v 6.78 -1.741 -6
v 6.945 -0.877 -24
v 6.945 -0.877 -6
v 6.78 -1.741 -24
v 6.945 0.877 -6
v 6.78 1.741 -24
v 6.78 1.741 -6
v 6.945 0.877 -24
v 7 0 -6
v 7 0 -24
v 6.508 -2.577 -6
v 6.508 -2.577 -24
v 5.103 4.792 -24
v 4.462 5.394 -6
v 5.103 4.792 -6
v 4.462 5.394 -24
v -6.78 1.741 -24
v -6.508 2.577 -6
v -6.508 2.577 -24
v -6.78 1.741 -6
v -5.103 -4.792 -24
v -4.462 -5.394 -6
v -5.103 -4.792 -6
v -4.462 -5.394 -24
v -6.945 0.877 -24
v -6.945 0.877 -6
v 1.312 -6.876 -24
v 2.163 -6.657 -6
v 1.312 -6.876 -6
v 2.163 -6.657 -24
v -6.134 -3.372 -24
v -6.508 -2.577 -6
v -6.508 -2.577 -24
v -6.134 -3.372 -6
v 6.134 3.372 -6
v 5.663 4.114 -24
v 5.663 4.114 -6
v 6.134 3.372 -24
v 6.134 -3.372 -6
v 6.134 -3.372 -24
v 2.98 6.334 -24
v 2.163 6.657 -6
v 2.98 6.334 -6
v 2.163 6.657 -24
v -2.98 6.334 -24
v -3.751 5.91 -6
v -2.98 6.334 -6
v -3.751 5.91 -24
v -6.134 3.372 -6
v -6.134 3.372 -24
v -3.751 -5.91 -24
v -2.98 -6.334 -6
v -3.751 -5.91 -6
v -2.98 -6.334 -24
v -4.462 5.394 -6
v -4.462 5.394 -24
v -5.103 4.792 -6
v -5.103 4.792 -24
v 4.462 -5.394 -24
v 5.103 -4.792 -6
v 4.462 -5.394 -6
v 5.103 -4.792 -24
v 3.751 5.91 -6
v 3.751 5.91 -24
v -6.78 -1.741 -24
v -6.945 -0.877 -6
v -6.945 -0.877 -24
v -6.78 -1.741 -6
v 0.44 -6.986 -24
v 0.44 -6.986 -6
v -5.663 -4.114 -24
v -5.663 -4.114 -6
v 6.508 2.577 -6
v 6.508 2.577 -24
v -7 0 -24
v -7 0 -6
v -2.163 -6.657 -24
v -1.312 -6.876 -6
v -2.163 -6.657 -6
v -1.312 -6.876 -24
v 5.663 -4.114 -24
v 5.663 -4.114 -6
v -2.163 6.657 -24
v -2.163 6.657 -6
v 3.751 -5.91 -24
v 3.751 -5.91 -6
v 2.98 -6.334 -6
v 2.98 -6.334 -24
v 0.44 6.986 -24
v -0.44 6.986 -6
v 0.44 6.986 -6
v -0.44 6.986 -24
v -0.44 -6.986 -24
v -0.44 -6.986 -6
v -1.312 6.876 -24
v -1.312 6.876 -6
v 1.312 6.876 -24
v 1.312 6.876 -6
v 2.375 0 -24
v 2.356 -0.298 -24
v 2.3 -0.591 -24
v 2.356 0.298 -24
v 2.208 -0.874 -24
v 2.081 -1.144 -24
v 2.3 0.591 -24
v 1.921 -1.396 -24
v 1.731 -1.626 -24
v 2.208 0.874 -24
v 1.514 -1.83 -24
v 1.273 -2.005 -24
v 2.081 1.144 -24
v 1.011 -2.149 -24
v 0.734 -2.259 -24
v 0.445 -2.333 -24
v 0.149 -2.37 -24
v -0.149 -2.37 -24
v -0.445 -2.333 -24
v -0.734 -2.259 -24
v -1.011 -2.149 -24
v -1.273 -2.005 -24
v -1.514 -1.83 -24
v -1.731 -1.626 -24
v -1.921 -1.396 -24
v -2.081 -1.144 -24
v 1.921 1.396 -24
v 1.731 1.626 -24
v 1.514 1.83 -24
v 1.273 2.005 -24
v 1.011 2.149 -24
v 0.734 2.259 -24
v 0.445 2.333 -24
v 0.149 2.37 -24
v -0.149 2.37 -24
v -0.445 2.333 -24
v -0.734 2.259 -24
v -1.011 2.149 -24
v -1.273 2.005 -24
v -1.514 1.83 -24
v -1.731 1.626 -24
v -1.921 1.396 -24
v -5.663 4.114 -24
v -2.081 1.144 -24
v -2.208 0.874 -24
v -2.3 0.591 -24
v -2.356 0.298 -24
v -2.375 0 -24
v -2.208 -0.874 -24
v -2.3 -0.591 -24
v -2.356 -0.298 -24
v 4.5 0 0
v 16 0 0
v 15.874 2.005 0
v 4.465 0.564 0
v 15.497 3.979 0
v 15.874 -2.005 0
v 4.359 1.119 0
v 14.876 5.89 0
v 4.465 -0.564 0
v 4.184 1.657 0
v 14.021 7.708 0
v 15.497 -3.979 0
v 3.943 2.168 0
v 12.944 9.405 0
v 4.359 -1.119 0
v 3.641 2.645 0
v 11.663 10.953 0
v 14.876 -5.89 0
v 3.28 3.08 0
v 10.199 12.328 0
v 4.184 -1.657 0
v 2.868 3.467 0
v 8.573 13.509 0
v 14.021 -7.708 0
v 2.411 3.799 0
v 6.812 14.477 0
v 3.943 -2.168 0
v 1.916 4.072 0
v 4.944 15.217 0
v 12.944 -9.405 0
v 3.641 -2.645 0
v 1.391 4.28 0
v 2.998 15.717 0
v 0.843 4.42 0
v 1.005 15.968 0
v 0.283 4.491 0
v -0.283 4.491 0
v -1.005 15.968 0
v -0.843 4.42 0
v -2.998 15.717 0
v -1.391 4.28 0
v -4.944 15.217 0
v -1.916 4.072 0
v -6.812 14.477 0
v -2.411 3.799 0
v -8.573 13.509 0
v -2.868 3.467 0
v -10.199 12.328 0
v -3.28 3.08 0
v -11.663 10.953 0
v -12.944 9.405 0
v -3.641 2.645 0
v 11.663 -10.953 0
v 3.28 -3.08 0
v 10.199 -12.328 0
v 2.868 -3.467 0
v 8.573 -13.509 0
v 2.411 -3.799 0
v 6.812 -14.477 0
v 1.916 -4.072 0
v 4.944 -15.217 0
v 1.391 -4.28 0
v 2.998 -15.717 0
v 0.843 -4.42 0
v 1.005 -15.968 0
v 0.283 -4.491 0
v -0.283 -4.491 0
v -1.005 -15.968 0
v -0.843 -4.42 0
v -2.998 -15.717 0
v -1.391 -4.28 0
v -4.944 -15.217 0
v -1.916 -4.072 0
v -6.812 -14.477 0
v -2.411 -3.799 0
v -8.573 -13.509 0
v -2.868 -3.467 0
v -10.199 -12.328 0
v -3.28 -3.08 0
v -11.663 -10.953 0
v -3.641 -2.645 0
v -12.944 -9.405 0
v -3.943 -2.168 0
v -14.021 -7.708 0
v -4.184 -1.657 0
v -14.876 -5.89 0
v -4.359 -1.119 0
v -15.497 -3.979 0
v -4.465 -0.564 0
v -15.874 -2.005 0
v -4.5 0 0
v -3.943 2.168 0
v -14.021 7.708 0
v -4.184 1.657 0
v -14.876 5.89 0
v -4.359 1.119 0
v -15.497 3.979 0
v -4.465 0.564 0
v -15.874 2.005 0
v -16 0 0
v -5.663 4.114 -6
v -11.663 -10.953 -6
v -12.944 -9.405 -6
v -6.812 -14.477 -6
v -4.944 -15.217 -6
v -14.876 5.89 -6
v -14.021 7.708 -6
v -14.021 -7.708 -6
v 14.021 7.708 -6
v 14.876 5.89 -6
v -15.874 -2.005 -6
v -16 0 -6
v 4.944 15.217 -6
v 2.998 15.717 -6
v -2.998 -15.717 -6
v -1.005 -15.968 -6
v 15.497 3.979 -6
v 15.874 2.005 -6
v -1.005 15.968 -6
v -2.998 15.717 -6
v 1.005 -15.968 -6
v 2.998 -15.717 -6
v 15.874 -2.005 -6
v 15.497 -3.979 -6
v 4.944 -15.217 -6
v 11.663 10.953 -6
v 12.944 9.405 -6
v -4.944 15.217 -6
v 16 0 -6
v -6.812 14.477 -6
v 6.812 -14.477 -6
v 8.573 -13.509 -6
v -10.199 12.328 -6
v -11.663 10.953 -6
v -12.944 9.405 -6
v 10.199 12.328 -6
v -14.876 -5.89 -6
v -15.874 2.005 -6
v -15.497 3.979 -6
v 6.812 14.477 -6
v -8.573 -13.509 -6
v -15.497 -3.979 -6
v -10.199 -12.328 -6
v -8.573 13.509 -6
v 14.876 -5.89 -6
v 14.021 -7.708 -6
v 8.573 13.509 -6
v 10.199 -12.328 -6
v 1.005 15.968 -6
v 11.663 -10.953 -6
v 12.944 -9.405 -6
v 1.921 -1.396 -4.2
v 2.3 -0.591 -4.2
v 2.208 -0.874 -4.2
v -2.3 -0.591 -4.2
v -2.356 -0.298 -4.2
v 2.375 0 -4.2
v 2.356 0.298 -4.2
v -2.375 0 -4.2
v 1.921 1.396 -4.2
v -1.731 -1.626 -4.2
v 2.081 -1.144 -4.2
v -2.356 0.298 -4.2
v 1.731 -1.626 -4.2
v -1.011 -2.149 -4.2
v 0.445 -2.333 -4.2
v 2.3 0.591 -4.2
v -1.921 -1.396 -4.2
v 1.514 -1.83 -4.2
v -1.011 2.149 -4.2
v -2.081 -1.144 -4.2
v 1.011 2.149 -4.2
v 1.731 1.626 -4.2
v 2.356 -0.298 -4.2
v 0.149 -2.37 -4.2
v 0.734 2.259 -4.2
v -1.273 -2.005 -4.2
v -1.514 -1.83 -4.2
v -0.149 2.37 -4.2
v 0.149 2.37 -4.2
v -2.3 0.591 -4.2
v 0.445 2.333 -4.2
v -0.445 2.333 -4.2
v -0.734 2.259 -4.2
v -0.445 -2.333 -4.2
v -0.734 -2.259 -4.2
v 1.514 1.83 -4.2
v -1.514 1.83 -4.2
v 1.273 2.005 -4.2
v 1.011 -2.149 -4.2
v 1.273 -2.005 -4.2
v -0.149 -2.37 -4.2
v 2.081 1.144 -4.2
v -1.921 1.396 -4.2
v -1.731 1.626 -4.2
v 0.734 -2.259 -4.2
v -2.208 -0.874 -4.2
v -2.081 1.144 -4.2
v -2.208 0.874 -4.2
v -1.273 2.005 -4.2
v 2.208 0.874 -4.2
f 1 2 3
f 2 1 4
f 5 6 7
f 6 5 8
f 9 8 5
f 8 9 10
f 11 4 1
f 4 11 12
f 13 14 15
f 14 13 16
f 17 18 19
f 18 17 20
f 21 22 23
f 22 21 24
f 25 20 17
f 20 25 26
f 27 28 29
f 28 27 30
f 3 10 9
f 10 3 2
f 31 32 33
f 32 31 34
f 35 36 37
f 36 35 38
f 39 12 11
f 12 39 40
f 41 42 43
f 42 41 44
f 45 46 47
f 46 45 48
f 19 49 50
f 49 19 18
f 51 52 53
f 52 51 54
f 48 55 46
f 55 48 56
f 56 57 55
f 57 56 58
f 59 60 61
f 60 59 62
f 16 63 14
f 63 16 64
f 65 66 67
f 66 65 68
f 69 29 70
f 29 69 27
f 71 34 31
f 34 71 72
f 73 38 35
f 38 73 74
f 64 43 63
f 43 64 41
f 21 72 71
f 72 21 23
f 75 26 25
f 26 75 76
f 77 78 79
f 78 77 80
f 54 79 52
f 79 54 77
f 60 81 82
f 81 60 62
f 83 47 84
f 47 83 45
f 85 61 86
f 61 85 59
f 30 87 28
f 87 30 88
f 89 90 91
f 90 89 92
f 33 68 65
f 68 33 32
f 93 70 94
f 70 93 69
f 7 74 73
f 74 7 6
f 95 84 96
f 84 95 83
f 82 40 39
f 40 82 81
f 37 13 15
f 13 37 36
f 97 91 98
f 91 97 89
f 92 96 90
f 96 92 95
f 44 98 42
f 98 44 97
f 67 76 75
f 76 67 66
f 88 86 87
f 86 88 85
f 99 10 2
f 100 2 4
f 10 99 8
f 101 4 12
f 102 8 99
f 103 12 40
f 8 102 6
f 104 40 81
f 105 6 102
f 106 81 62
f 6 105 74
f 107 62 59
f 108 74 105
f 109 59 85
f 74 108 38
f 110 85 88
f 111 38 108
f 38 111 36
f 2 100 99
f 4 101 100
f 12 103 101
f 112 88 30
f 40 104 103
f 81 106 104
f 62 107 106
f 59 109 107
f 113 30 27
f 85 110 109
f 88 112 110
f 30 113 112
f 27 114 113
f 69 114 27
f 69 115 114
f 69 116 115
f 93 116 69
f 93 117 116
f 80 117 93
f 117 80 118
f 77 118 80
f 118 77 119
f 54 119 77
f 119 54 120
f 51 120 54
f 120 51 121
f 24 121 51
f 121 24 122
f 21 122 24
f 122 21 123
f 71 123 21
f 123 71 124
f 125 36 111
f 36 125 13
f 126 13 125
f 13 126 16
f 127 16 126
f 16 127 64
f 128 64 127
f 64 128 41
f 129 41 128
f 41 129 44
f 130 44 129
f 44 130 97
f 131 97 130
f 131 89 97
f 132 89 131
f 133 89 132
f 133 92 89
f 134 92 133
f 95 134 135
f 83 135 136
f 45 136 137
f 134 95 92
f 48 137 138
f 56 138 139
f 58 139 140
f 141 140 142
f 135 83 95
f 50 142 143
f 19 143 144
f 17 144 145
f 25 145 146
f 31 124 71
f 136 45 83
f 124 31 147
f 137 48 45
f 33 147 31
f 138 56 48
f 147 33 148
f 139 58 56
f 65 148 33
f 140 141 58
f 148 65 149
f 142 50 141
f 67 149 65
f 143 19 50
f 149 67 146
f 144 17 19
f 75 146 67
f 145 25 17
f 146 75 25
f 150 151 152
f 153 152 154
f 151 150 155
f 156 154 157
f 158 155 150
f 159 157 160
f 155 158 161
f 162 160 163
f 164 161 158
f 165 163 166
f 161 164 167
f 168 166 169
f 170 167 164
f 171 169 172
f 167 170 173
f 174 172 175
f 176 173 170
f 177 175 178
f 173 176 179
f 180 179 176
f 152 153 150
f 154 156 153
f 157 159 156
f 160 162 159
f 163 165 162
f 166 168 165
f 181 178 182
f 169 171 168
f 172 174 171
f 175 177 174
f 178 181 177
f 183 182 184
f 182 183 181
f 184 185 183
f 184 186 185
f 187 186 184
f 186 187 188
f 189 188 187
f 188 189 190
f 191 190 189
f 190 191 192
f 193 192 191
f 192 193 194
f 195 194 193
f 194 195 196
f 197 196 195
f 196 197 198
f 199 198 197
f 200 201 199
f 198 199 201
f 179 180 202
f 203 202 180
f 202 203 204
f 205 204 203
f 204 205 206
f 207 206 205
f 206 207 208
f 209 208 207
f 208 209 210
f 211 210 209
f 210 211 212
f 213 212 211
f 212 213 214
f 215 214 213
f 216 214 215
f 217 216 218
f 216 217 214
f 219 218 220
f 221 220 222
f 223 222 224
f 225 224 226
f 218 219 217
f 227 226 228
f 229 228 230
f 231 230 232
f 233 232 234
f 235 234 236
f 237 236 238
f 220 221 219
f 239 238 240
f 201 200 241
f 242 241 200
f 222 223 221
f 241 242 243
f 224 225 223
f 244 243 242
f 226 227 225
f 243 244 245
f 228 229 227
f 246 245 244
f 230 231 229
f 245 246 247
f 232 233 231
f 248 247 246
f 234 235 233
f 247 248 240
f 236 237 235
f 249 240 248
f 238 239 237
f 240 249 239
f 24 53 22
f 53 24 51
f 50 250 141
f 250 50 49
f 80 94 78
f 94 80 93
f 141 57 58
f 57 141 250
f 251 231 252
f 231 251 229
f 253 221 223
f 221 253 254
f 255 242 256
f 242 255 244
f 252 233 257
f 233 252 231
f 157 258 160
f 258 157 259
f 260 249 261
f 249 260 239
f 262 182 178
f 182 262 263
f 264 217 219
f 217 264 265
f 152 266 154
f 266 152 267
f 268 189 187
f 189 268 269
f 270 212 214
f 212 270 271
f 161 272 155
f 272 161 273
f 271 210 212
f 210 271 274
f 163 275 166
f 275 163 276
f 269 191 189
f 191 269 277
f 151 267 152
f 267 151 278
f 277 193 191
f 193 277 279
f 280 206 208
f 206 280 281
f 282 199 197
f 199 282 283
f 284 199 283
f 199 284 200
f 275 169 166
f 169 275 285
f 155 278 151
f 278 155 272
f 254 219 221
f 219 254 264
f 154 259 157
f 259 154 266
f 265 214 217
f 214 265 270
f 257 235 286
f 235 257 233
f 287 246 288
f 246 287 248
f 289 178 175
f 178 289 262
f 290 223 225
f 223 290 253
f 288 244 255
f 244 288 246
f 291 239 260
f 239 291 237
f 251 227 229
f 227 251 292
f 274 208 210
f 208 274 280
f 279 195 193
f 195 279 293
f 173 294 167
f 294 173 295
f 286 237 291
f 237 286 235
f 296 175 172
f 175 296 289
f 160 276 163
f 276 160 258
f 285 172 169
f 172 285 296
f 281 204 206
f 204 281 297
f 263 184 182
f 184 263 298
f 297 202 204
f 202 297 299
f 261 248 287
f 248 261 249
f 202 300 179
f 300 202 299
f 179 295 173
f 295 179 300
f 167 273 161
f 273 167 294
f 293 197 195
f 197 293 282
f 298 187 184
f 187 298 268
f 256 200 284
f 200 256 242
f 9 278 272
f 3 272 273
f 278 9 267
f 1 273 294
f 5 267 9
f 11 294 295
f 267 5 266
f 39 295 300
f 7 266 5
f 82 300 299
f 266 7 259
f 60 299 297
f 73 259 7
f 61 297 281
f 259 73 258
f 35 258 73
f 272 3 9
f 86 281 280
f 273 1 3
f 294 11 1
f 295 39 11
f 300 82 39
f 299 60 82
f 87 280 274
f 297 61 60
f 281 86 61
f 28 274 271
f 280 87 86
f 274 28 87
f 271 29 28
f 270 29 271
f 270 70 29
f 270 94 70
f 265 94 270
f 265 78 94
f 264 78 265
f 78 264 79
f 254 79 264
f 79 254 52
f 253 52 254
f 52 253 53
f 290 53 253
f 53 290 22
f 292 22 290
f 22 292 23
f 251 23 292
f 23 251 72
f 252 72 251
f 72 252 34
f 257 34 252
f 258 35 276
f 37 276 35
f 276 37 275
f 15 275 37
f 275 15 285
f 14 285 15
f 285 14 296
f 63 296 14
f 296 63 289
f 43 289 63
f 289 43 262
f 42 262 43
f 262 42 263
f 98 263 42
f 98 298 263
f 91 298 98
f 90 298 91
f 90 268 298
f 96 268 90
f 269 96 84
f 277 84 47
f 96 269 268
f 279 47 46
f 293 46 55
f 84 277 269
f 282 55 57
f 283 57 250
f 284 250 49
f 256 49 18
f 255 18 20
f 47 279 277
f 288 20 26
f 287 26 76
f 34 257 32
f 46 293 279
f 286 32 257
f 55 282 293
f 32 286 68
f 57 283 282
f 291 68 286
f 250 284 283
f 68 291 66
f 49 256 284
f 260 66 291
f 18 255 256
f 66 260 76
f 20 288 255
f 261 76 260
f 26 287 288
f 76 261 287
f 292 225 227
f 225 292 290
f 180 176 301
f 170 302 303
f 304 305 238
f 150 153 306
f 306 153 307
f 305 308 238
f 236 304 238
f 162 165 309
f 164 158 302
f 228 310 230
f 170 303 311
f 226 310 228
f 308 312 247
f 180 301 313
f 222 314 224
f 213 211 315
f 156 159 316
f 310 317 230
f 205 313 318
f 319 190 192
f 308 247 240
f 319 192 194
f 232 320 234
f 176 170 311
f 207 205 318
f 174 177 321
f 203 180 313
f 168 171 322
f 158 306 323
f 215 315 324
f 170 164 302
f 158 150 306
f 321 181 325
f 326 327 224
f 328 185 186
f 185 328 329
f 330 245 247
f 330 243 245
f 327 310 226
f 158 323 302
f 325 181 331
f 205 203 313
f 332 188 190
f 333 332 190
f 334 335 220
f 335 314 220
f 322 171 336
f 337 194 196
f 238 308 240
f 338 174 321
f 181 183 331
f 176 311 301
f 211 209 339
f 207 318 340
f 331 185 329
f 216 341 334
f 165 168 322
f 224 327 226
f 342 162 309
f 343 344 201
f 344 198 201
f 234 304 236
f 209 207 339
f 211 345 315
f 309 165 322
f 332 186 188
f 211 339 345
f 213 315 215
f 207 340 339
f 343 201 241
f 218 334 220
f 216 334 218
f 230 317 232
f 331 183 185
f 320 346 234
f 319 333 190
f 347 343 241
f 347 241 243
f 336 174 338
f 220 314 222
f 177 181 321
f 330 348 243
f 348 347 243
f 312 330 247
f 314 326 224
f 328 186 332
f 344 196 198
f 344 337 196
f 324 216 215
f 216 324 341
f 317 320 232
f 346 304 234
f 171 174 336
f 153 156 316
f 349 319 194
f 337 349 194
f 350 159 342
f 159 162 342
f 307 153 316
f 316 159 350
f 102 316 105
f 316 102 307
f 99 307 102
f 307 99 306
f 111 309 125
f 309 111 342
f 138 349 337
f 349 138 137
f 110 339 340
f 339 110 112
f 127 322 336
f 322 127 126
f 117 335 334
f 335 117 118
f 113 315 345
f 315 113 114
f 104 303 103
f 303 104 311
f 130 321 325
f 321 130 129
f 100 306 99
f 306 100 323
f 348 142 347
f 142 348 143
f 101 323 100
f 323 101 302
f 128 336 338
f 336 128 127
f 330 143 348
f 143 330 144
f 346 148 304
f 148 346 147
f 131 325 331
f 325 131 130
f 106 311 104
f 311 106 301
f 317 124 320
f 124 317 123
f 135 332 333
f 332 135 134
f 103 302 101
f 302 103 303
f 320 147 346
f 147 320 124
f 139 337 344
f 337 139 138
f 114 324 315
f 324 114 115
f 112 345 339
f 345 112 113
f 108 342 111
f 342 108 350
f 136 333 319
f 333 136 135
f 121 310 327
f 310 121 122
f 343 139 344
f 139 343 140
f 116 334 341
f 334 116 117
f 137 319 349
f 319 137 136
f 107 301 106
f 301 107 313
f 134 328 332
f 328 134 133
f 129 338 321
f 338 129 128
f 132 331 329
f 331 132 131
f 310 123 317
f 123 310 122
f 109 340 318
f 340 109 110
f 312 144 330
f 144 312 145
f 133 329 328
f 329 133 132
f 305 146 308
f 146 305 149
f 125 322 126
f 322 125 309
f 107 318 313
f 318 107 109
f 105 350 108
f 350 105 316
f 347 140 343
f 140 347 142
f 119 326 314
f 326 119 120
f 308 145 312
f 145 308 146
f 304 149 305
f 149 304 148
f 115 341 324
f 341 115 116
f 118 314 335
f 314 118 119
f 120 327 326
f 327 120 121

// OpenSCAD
$fn = 50;


difference() {
	union() {
		translate(v = [0, 0, -24.0000000000]) {
			cylinder(h = 24, r = 7.0000000000);
		}
		translate(v = [0, 0, -6.0000000000]) {
			cylinder(h = 6, r = 16.0000000000);
		}
	}
	union() {
		translate(v = [0, 0, 0]) {
			rotate(a = [0, 0, 0]) {
				difference() {
					union() {
						#translate(v = [0, 0, -24.0000000000]) {
							cylinder(h = 24, r = 2.2500000000);
						}
						#translate(v = [0, 0, -4.2000000000]) {
							cylinder(h = 4.2000000000, r = 7.0000000000, r1 = 2.3750000000, r2 = 4.5000000000);
						}
						#translate(v = [0, 0, -24.0000000000]) {
							cylinder(h = 24, r = 2.3750000000);
						}
						#translate(v = [0, 0, -24.0000000000]) {
							cylinder(h = 24, r = 2.2500000000);
						}
					}
					union();
				}
			}
		}
	}
}
